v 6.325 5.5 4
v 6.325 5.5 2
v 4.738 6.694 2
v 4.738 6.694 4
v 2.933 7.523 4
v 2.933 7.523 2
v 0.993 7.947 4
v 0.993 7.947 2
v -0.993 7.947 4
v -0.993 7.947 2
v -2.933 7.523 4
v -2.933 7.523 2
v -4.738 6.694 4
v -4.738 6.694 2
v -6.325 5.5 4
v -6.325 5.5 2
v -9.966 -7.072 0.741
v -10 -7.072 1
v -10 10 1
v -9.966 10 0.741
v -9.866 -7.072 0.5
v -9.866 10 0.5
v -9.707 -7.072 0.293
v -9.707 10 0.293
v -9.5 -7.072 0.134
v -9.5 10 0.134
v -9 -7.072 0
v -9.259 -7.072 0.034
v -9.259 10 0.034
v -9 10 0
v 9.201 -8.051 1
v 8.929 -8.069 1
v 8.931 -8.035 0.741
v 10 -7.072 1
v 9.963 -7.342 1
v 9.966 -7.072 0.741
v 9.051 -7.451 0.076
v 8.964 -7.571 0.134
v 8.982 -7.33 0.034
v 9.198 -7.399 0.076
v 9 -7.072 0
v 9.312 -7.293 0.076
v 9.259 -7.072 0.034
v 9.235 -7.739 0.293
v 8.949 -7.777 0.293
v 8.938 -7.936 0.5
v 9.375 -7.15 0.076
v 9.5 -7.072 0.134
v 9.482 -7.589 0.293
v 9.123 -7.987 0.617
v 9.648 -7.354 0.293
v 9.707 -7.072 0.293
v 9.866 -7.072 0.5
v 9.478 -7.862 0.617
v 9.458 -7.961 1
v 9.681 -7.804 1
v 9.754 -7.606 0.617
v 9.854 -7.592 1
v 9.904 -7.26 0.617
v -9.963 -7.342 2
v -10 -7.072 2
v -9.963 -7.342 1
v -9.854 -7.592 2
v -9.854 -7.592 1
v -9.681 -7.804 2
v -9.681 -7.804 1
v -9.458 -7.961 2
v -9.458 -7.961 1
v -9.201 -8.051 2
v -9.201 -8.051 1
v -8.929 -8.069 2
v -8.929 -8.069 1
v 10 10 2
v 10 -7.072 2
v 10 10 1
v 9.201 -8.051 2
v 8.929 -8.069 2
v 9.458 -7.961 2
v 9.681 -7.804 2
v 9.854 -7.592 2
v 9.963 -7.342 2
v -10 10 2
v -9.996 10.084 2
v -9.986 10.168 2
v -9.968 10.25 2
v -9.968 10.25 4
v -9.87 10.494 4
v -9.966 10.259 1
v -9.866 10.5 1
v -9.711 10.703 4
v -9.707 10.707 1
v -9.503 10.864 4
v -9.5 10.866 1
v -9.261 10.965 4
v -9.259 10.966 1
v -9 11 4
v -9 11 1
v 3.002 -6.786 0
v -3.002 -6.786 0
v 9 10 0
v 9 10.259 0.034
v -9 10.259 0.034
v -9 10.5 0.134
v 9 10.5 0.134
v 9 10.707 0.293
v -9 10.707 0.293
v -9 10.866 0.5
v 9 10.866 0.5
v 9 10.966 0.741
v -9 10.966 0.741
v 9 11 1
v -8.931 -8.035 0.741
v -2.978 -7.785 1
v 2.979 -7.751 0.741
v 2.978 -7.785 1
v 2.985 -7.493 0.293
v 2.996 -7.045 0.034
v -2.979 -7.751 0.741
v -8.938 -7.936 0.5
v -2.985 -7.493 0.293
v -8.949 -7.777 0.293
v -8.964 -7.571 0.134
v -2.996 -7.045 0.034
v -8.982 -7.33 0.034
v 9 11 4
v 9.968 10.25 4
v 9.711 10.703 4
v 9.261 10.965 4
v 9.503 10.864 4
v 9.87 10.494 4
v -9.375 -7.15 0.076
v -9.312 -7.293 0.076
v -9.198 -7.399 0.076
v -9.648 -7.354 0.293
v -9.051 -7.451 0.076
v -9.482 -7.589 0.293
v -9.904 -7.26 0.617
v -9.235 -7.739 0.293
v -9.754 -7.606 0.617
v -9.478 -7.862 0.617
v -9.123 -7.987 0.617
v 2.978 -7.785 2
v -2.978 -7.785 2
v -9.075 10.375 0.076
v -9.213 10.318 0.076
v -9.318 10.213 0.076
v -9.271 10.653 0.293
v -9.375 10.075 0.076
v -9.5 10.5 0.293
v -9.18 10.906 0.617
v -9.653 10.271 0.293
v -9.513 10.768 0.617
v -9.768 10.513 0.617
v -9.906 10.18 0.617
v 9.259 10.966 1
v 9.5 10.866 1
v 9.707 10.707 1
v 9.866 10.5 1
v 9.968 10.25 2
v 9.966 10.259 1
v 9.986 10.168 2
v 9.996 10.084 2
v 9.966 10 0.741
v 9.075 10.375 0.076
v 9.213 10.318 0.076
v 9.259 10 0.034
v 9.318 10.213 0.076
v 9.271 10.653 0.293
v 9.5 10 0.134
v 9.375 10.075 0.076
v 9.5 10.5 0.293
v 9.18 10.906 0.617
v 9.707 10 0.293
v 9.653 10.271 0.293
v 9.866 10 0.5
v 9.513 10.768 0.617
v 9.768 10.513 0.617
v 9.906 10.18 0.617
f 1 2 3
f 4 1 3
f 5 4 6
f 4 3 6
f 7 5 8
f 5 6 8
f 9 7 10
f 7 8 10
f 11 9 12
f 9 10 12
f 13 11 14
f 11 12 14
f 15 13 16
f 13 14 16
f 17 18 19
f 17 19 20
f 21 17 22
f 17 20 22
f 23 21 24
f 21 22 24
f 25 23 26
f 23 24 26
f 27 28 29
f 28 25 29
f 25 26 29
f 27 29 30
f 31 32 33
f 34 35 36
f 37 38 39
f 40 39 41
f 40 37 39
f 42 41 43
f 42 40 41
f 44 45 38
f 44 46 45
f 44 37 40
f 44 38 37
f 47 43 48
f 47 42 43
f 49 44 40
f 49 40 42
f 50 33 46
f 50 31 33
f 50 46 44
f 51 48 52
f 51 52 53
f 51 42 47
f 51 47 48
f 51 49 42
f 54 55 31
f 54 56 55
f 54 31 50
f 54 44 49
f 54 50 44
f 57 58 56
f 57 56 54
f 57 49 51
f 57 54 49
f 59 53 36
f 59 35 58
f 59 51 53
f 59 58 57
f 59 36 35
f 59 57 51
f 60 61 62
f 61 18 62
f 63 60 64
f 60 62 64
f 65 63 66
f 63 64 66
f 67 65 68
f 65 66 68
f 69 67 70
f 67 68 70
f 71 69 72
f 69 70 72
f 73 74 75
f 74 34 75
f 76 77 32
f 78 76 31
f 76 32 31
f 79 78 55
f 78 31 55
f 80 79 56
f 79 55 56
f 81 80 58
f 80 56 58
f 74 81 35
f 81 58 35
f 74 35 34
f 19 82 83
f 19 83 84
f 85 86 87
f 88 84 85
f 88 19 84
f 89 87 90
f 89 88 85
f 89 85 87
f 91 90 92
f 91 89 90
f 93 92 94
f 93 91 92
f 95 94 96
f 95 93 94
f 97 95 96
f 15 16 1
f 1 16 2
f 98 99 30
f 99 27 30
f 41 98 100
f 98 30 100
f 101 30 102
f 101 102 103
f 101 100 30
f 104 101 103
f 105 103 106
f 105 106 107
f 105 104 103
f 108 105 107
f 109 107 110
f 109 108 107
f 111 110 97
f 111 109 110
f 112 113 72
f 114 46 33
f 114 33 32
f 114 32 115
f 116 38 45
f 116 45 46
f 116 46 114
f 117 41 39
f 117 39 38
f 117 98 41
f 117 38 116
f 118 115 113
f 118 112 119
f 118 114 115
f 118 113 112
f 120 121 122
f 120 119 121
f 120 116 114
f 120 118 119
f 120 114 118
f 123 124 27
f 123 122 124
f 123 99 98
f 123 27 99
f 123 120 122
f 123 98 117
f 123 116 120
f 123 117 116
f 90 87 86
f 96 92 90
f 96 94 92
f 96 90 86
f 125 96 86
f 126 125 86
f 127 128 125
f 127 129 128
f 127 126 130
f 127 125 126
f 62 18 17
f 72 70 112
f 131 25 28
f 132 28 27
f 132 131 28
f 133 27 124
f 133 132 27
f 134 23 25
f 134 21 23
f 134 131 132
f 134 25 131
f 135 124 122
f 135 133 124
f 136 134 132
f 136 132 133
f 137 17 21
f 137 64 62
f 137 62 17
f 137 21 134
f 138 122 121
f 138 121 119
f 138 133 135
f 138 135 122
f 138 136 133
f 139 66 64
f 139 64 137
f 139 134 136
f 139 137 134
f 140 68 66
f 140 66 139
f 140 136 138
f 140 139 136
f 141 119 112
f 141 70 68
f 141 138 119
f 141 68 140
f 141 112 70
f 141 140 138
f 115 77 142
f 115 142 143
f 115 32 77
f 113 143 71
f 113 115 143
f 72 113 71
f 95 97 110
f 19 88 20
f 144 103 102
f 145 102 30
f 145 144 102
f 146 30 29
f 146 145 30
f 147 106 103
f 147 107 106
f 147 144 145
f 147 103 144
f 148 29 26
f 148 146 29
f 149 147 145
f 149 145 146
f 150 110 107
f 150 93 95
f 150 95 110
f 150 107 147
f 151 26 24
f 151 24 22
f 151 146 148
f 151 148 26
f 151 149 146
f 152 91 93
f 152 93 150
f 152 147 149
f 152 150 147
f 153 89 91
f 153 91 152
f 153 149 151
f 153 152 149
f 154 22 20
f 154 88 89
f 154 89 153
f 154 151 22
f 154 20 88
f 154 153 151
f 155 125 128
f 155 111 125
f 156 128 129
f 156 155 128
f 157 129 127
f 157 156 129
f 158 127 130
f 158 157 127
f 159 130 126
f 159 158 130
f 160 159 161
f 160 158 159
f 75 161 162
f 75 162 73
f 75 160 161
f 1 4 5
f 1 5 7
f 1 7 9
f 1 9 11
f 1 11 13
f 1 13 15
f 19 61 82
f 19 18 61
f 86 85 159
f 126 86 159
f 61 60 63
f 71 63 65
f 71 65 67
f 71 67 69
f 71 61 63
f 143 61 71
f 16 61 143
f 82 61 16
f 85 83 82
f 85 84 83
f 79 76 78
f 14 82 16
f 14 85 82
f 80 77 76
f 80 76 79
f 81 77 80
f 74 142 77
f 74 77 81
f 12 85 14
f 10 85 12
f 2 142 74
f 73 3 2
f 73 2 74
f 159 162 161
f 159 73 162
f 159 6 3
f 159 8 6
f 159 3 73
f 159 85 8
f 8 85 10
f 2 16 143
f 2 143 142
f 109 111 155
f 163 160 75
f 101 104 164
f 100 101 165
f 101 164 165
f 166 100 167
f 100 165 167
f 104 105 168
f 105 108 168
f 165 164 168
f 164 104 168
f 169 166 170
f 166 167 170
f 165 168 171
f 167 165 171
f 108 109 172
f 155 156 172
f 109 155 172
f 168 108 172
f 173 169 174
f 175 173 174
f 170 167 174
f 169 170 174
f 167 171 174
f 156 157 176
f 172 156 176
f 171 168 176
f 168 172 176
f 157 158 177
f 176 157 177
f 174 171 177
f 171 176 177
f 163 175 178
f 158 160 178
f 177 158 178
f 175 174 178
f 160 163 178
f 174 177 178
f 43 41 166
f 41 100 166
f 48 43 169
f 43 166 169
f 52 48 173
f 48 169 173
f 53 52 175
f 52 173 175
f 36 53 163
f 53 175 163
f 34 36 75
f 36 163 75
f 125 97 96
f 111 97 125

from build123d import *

# Parameters (mm, degrees)
F0_W     = 20
F0_H     = 22
F1_DEPTH = 2
F2_R     = 9.25
F4_DEPTH = 2
F3_W     = 20
F3_H     = 18
F5_DEPTH = 2
F6_W     = 20
F6_H     = 0.75
F7_DEPTH = 2
F8_R     = 125
F9_DEPTH = 2
F10_R    = 1


with BuildPart() as f1:
    # F0 (on Top) → F1 (new body)
    with BuildSketch(Plane.XY):
        Rectangle(F0_W, F0_H)
    extrude(amount=F1_DEPTH)

    # F2 (on face) → F4 (join)
    with BuildSketch(Plane.XY.offset(2)):
        with Locations((0, -1.25)):
            Circle(F2_R)
    extrude(amount=F4_DEPTH)

    # F3 (on face) → F5 (cut)
    with BuildSketch(Plane.XY.offset(2)):
        with Locations((0, -3.5)):
            Rectangle(F3_W, F3_H)
    extrude(amount=F5_DEPTH, mode=Mode.SUBTRACT)

    # F6 (on face) → F7 (join)
    with BuildSketch(Plane.XY.offset(2)):
        with Locations((0, 10.625)):
            Rectangle(F6_W, F6_H)
    extrude(amount=F7_DEPTH)

    # F8 (on Top) → F9 (cut)
    with BuildSketch(Plane.XY):
        with Locations((0, -132.75)):
            Circle(F8_R)
    extrude(amount=F9_DEPTH, mode=Mode.SUBTRACT)

    # F10
    f10_edges = [f1.edges().sort_by_distance(p)[0] for p in [
        (10, -8.150642, 1),
        (-10, -8.150642, 1),
        (10, 11, 2),
        (-10, 11, 2),
        (0, 11, 0),
        (-10, 1.424679, 0),
        (0, -7.75, 0),
        (10, 1.424679, 0),
    ]]
    fillet(f10_edges, radius=F10_R)


solid = f1.part
